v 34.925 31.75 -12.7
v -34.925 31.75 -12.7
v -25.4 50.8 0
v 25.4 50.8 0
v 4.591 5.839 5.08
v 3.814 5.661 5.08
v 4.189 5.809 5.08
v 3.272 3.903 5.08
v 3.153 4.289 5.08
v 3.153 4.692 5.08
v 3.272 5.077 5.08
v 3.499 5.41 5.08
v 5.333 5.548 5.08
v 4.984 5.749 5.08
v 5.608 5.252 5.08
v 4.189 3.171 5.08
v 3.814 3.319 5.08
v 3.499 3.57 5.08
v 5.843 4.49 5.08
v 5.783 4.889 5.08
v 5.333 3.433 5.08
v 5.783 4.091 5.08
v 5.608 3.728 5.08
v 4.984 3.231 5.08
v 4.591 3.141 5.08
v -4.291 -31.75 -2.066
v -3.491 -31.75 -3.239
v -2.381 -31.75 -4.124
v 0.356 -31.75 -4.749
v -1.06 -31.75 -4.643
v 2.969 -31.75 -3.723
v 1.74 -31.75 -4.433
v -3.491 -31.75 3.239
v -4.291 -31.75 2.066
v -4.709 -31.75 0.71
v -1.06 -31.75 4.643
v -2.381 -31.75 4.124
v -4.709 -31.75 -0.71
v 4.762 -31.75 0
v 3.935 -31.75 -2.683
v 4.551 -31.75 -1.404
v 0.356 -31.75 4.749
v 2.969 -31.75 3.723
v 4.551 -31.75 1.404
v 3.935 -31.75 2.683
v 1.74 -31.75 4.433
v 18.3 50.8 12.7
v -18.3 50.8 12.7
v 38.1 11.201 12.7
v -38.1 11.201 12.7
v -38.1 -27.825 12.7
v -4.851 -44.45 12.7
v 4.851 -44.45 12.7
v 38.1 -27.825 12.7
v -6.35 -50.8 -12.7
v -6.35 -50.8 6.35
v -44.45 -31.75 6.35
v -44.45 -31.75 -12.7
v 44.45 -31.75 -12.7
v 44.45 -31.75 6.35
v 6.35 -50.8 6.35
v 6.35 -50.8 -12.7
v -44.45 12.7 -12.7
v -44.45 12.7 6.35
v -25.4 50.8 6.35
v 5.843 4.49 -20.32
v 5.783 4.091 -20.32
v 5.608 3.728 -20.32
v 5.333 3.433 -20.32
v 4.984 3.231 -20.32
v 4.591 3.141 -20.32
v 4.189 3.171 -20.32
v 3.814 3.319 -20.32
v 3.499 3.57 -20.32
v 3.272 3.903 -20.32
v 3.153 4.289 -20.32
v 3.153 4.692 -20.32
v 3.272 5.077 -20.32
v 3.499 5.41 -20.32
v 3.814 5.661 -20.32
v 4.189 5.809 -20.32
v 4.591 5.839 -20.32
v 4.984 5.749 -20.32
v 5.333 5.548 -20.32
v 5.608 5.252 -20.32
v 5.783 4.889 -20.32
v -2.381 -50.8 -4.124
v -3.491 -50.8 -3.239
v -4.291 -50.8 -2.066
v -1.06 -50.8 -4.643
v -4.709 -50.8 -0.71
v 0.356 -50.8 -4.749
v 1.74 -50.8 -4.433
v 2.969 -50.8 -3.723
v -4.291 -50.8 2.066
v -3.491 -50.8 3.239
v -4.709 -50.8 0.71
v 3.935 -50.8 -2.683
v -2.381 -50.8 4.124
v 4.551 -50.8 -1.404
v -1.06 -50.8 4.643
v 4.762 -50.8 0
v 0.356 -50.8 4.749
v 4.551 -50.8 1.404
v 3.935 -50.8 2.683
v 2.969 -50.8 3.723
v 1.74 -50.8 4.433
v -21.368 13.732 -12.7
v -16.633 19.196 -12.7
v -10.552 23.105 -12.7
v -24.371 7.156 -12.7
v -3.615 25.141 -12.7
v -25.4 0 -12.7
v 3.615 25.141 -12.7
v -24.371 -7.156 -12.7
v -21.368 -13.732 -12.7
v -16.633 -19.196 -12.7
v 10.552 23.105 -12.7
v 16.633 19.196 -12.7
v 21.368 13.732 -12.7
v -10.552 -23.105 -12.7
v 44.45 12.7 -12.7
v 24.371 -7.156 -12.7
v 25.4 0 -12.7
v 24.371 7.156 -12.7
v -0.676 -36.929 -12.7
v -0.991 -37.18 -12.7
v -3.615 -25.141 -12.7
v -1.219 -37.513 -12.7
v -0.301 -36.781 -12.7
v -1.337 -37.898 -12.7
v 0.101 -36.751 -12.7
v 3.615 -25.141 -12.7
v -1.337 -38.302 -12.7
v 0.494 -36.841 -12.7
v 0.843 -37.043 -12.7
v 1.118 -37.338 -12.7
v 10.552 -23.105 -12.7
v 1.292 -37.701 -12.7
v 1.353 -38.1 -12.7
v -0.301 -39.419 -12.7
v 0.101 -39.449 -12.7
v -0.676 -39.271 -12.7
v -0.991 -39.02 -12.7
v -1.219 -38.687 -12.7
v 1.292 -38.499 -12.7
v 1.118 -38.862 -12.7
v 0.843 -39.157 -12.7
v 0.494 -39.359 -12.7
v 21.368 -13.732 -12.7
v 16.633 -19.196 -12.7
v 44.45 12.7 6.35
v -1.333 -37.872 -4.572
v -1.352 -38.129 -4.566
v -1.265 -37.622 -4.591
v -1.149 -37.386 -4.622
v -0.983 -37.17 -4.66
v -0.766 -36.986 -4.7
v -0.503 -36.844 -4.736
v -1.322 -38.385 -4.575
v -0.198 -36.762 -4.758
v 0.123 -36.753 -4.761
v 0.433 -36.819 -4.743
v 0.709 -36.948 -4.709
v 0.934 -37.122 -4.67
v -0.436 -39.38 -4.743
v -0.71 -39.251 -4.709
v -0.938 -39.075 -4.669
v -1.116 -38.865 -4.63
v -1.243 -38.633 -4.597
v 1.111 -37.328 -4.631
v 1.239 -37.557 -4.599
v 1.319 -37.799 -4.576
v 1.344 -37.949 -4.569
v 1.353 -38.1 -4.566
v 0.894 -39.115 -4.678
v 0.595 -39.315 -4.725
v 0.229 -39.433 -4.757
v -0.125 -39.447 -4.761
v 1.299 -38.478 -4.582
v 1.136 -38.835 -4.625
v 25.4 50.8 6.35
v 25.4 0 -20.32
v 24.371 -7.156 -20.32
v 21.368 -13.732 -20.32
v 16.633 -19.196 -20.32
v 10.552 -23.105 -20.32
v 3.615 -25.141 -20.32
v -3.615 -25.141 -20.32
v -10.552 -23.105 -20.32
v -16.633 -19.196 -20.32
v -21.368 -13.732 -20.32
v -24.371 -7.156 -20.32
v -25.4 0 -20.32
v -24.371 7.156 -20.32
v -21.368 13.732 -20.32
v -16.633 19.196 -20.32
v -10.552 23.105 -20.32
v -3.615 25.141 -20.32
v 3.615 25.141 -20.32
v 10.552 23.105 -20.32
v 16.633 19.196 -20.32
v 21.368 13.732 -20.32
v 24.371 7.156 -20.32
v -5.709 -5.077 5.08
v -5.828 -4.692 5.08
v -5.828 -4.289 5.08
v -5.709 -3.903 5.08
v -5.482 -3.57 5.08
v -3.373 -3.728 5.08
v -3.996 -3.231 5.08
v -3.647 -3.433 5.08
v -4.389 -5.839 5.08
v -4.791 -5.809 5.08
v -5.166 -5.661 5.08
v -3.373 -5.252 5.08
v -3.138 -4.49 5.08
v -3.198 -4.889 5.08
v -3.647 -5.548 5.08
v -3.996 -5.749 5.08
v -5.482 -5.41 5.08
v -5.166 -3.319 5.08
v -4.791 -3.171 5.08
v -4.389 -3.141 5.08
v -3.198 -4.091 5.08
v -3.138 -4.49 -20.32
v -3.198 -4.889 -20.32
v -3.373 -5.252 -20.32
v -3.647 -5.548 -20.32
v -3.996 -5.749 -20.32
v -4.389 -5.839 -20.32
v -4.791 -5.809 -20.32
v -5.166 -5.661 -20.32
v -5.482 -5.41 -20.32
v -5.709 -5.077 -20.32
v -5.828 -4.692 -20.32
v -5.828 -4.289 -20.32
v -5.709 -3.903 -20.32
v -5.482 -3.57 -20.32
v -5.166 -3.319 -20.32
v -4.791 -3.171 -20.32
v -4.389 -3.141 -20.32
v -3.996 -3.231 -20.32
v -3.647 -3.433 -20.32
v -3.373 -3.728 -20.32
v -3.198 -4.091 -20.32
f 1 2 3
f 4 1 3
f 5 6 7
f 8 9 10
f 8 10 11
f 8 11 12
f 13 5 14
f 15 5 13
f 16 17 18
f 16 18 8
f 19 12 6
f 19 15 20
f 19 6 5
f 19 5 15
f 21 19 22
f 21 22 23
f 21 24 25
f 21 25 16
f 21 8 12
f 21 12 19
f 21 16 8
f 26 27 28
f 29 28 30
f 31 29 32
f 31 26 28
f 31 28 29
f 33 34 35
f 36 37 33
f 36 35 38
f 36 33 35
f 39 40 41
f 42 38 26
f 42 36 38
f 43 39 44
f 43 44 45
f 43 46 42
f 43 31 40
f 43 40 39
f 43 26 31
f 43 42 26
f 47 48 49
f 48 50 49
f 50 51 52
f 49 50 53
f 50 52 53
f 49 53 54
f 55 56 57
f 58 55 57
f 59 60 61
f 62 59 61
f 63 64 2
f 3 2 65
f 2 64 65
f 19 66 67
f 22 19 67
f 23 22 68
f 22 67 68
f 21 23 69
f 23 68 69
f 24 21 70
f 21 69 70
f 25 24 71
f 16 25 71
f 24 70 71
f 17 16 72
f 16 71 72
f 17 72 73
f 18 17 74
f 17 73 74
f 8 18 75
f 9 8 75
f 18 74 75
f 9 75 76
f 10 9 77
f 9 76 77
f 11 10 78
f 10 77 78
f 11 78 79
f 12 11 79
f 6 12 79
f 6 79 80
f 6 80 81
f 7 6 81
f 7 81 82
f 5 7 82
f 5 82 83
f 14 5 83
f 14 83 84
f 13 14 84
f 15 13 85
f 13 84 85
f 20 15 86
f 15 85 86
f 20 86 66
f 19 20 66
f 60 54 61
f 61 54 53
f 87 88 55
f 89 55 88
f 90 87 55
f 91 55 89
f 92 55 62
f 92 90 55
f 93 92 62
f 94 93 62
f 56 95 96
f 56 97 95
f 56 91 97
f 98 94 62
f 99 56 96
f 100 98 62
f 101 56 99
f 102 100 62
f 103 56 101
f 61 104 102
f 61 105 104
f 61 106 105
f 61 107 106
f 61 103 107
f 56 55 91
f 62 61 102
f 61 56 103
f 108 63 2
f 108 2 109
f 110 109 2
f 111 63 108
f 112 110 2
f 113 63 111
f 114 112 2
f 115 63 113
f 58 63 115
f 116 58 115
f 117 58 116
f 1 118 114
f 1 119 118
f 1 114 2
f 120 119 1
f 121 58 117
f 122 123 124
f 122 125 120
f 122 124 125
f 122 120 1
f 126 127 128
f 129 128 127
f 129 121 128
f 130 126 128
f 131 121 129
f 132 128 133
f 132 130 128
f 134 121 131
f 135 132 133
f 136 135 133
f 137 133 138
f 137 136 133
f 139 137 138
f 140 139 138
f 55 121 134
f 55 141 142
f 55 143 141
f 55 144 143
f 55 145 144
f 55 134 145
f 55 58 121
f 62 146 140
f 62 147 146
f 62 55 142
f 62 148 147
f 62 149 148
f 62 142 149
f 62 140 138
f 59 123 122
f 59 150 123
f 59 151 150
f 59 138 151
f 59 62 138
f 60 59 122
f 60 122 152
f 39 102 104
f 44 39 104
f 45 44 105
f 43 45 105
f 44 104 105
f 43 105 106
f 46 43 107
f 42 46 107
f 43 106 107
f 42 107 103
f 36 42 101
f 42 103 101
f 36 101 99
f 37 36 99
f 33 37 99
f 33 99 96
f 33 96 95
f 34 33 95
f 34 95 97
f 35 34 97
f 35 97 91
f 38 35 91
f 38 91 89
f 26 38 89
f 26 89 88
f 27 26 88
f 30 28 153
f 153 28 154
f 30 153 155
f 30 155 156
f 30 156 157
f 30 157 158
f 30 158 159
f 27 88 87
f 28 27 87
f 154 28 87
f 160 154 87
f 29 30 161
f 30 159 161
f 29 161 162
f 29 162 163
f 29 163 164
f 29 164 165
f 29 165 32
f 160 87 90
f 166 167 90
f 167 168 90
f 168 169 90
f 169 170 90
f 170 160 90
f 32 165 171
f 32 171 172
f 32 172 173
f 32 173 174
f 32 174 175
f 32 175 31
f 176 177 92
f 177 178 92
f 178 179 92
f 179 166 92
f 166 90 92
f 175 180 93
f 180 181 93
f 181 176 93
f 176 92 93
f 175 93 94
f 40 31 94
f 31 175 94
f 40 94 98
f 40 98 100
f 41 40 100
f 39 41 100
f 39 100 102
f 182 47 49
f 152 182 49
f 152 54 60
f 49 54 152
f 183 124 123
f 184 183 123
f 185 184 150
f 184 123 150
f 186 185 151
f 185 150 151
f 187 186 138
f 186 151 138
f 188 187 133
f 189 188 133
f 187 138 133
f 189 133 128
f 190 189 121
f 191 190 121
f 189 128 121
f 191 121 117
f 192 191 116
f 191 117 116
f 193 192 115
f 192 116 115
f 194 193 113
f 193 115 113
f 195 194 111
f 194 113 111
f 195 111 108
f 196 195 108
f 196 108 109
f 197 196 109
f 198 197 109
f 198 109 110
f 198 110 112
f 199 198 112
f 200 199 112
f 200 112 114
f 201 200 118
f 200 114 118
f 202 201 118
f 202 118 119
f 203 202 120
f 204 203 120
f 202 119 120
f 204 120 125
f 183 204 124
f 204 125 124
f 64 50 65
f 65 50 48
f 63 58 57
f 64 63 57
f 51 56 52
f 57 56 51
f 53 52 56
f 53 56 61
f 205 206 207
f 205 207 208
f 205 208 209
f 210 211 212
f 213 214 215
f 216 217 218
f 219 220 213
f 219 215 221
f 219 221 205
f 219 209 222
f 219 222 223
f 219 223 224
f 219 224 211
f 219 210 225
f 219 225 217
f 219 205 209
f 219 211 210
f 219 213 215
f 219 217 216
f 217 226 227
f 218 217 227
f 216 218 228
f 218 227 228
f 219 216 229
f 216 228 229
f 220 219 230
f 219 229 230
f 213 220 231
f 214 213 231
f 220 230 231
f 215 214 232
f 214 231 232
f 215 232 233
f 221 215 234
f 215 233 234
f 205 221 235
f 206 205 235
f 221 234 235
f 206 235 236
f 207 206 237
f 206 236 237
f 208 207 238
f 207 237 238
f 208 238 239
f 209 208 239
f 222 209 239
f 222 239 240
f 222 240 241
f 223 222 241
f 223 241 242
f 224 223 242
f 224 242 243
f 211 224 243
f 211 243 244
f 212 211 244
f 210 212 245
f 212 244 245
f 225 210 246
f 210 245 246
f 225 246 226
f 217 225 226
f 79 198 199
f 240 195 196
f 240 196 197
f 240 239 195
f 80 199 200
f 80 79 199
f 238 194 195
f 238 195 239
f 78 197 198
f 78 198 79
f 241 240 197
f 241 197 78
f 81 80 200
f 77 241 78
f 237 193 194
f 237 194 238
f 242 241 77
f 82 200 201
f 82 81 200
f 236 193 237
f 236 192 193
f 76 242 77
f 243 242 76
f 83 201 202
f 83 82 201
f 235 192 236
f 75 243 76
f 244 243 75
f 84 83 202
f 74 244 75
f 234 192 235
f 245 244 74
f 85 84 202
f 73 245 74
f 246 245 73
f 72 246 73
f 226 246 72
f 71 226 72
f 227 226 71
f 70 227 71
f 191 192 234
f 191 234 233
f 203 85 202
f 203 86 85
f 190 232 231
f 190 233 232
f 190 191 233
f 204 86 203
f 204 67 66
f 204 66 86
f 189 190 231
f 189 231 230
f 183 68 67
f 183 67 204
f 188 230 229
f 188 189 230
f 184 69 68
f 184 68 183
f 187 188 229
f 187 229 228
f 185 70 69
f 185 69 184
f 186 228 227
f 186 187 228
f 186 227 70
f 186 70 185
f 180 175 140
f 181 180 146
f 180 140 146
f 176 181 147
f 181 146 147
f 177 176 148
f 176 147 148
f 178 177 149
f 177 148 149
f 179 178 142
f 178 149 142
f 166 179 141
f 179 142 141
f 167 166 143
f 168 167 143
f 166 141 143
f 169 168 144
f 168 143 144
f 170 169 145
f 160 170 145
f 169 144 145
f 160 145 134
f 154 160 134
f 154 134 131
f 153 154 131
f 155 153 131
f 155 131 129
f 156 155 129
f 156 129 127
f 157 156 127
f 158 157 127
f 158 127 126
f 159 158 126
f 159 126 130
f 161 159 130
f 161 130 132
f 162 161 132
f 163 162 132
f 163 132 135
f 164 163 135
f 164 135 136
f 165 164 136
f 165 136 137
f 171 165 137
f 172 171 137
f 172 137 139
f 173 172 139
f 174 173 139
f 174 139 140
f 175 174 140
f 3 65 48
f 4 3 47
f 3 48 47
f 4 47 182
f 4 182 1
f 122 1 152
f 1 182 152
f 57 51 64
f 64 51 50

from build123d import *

# Parameters (mm, degrees)
F0_W      = 88.9
F0_H      = 25.4
F1_DEPTH  = 50.8
F3_DEPTH  = 25.4
F5_DEPTH  = 44.451
F6_DEPTH  = 44.451
F7_SIZE   = 6.35
F8_R      = 25.4
F9_DEPTH  = 7.62
F10_R     = 1.35255
F11_DEPTH = 25.4
F12_R     = 4.7625
F13_DEPTH = 19.05
F14_R     = 1.35255
F15_DEPTH = 12.7


with BuildPart() as f1:
    # F0 (on Front) → F1 (new body, symmetric)
    with BuildSketch(Plane.XZ):
        Rectangle(F0_W, F0_H)
    extrude(amount=F1_DEPTH, both=True)

    # F2 (on face) → F3 (cut)
    with BuildSketch(Plane.XY.offset(12.7)):
        Polygon((44.45, -31.75), (6.35, -50.8), (44.45, -50.8), align=None)
        Polygon((-6.35, -50.8), (-44.45, -31.75), (-44.45, -50.8), align=None)
        Polygon((-25.4, 50.8), (-44.45, 50.8), (-44.45, 12.7), align=None)
        Polygon((44.45, 12.7), (44.45, 50.8), (25.4, 50.8), align=None)
    extrude(amount=-F3_DEPTH, mode=Mode.SUBTRACT)

    # F4 (on Right) → F5 (cut, through all)
    with BuildSketch(Plane.YZ):
        Polygon((50.8, 0), (31.75, -12.7), (50.8, -12.7), align=None)
    extrude(amount=-F5_DEPTH, mode=Mode.SUBTRACT)

    # F5_face (on face) → F6 (cut, through all)
    with BuildSketch(Plane(origin=(0, 44.45, -8.466667), x_dir=(0, 1, 0), z_dir=(-1, 0, 0))):
        Polygon((-12.7, 4.233333), (6.35, -8.466667), (6.35, 4.233333), align=None)
    extrude(amount=-F6_DEPTH, mode=Mode.SUBTRACT)

    # F7
    f7_edges = [f1.edges().sort_by_distance(p)[0] for p in [
        (25.4, -41.275, 12.7),
        (0, -50.8, 12.7),
        (-25.4, -41.275, 12.7),
        (-44.45, -9.525, 12.7),
        (-34.925, 31.75, 12.7),
        (44.45, -9.525, 12.7),
        (34.925, 31.75, 12.7),
    ]]
    chamfer(f7_edges, length=F7_SIZE)

    # F8 (on face) → F9 (join)
    with BuildSketch(Plane(origin=(0, 0, -12.7), x_dir=(1, 0, 0), z_dir=(0, 0, -1))):
        Circle(F8_R)
    extrude(amount=F9_DEPTH)

    # F10 (on face) → F11 (cut)
    with BuildSketch(Plane(origin=(0, 0, -20.32), x_dir=(1, 0, 0), z_dir=(0, 0, -1))):
        with Locations((4.490128, -4.490128)):
            Circle(F10_R)
        with Locations((-4.490128, 4.490128)):
            Circle(F10_R)
    extrude(amount=-F11_DEPTH, mode=Mode.SUBTRACT)

    # F12 (on face) → F13 (cut)
    with BuildSketch(Plane.XZ.offset(50.8)):
        Circle(F12_R)
    extrude(amount=-F13_DEPTH, mode=Mode.SUBTRACT)

    # F14 (on face) → F15 (cut)
    with BuildSketch(Plane(origin=(0, 0, -12.7), x_dir=(1, 0, 0), z_dir=(0, 0, -1))):
        with Locations((0, 38.1)):
            Circle(F14_R)
    extrude(amount=-F15_DEPTH, mode=Mode.SUBTRACT)


solid = f1.part
